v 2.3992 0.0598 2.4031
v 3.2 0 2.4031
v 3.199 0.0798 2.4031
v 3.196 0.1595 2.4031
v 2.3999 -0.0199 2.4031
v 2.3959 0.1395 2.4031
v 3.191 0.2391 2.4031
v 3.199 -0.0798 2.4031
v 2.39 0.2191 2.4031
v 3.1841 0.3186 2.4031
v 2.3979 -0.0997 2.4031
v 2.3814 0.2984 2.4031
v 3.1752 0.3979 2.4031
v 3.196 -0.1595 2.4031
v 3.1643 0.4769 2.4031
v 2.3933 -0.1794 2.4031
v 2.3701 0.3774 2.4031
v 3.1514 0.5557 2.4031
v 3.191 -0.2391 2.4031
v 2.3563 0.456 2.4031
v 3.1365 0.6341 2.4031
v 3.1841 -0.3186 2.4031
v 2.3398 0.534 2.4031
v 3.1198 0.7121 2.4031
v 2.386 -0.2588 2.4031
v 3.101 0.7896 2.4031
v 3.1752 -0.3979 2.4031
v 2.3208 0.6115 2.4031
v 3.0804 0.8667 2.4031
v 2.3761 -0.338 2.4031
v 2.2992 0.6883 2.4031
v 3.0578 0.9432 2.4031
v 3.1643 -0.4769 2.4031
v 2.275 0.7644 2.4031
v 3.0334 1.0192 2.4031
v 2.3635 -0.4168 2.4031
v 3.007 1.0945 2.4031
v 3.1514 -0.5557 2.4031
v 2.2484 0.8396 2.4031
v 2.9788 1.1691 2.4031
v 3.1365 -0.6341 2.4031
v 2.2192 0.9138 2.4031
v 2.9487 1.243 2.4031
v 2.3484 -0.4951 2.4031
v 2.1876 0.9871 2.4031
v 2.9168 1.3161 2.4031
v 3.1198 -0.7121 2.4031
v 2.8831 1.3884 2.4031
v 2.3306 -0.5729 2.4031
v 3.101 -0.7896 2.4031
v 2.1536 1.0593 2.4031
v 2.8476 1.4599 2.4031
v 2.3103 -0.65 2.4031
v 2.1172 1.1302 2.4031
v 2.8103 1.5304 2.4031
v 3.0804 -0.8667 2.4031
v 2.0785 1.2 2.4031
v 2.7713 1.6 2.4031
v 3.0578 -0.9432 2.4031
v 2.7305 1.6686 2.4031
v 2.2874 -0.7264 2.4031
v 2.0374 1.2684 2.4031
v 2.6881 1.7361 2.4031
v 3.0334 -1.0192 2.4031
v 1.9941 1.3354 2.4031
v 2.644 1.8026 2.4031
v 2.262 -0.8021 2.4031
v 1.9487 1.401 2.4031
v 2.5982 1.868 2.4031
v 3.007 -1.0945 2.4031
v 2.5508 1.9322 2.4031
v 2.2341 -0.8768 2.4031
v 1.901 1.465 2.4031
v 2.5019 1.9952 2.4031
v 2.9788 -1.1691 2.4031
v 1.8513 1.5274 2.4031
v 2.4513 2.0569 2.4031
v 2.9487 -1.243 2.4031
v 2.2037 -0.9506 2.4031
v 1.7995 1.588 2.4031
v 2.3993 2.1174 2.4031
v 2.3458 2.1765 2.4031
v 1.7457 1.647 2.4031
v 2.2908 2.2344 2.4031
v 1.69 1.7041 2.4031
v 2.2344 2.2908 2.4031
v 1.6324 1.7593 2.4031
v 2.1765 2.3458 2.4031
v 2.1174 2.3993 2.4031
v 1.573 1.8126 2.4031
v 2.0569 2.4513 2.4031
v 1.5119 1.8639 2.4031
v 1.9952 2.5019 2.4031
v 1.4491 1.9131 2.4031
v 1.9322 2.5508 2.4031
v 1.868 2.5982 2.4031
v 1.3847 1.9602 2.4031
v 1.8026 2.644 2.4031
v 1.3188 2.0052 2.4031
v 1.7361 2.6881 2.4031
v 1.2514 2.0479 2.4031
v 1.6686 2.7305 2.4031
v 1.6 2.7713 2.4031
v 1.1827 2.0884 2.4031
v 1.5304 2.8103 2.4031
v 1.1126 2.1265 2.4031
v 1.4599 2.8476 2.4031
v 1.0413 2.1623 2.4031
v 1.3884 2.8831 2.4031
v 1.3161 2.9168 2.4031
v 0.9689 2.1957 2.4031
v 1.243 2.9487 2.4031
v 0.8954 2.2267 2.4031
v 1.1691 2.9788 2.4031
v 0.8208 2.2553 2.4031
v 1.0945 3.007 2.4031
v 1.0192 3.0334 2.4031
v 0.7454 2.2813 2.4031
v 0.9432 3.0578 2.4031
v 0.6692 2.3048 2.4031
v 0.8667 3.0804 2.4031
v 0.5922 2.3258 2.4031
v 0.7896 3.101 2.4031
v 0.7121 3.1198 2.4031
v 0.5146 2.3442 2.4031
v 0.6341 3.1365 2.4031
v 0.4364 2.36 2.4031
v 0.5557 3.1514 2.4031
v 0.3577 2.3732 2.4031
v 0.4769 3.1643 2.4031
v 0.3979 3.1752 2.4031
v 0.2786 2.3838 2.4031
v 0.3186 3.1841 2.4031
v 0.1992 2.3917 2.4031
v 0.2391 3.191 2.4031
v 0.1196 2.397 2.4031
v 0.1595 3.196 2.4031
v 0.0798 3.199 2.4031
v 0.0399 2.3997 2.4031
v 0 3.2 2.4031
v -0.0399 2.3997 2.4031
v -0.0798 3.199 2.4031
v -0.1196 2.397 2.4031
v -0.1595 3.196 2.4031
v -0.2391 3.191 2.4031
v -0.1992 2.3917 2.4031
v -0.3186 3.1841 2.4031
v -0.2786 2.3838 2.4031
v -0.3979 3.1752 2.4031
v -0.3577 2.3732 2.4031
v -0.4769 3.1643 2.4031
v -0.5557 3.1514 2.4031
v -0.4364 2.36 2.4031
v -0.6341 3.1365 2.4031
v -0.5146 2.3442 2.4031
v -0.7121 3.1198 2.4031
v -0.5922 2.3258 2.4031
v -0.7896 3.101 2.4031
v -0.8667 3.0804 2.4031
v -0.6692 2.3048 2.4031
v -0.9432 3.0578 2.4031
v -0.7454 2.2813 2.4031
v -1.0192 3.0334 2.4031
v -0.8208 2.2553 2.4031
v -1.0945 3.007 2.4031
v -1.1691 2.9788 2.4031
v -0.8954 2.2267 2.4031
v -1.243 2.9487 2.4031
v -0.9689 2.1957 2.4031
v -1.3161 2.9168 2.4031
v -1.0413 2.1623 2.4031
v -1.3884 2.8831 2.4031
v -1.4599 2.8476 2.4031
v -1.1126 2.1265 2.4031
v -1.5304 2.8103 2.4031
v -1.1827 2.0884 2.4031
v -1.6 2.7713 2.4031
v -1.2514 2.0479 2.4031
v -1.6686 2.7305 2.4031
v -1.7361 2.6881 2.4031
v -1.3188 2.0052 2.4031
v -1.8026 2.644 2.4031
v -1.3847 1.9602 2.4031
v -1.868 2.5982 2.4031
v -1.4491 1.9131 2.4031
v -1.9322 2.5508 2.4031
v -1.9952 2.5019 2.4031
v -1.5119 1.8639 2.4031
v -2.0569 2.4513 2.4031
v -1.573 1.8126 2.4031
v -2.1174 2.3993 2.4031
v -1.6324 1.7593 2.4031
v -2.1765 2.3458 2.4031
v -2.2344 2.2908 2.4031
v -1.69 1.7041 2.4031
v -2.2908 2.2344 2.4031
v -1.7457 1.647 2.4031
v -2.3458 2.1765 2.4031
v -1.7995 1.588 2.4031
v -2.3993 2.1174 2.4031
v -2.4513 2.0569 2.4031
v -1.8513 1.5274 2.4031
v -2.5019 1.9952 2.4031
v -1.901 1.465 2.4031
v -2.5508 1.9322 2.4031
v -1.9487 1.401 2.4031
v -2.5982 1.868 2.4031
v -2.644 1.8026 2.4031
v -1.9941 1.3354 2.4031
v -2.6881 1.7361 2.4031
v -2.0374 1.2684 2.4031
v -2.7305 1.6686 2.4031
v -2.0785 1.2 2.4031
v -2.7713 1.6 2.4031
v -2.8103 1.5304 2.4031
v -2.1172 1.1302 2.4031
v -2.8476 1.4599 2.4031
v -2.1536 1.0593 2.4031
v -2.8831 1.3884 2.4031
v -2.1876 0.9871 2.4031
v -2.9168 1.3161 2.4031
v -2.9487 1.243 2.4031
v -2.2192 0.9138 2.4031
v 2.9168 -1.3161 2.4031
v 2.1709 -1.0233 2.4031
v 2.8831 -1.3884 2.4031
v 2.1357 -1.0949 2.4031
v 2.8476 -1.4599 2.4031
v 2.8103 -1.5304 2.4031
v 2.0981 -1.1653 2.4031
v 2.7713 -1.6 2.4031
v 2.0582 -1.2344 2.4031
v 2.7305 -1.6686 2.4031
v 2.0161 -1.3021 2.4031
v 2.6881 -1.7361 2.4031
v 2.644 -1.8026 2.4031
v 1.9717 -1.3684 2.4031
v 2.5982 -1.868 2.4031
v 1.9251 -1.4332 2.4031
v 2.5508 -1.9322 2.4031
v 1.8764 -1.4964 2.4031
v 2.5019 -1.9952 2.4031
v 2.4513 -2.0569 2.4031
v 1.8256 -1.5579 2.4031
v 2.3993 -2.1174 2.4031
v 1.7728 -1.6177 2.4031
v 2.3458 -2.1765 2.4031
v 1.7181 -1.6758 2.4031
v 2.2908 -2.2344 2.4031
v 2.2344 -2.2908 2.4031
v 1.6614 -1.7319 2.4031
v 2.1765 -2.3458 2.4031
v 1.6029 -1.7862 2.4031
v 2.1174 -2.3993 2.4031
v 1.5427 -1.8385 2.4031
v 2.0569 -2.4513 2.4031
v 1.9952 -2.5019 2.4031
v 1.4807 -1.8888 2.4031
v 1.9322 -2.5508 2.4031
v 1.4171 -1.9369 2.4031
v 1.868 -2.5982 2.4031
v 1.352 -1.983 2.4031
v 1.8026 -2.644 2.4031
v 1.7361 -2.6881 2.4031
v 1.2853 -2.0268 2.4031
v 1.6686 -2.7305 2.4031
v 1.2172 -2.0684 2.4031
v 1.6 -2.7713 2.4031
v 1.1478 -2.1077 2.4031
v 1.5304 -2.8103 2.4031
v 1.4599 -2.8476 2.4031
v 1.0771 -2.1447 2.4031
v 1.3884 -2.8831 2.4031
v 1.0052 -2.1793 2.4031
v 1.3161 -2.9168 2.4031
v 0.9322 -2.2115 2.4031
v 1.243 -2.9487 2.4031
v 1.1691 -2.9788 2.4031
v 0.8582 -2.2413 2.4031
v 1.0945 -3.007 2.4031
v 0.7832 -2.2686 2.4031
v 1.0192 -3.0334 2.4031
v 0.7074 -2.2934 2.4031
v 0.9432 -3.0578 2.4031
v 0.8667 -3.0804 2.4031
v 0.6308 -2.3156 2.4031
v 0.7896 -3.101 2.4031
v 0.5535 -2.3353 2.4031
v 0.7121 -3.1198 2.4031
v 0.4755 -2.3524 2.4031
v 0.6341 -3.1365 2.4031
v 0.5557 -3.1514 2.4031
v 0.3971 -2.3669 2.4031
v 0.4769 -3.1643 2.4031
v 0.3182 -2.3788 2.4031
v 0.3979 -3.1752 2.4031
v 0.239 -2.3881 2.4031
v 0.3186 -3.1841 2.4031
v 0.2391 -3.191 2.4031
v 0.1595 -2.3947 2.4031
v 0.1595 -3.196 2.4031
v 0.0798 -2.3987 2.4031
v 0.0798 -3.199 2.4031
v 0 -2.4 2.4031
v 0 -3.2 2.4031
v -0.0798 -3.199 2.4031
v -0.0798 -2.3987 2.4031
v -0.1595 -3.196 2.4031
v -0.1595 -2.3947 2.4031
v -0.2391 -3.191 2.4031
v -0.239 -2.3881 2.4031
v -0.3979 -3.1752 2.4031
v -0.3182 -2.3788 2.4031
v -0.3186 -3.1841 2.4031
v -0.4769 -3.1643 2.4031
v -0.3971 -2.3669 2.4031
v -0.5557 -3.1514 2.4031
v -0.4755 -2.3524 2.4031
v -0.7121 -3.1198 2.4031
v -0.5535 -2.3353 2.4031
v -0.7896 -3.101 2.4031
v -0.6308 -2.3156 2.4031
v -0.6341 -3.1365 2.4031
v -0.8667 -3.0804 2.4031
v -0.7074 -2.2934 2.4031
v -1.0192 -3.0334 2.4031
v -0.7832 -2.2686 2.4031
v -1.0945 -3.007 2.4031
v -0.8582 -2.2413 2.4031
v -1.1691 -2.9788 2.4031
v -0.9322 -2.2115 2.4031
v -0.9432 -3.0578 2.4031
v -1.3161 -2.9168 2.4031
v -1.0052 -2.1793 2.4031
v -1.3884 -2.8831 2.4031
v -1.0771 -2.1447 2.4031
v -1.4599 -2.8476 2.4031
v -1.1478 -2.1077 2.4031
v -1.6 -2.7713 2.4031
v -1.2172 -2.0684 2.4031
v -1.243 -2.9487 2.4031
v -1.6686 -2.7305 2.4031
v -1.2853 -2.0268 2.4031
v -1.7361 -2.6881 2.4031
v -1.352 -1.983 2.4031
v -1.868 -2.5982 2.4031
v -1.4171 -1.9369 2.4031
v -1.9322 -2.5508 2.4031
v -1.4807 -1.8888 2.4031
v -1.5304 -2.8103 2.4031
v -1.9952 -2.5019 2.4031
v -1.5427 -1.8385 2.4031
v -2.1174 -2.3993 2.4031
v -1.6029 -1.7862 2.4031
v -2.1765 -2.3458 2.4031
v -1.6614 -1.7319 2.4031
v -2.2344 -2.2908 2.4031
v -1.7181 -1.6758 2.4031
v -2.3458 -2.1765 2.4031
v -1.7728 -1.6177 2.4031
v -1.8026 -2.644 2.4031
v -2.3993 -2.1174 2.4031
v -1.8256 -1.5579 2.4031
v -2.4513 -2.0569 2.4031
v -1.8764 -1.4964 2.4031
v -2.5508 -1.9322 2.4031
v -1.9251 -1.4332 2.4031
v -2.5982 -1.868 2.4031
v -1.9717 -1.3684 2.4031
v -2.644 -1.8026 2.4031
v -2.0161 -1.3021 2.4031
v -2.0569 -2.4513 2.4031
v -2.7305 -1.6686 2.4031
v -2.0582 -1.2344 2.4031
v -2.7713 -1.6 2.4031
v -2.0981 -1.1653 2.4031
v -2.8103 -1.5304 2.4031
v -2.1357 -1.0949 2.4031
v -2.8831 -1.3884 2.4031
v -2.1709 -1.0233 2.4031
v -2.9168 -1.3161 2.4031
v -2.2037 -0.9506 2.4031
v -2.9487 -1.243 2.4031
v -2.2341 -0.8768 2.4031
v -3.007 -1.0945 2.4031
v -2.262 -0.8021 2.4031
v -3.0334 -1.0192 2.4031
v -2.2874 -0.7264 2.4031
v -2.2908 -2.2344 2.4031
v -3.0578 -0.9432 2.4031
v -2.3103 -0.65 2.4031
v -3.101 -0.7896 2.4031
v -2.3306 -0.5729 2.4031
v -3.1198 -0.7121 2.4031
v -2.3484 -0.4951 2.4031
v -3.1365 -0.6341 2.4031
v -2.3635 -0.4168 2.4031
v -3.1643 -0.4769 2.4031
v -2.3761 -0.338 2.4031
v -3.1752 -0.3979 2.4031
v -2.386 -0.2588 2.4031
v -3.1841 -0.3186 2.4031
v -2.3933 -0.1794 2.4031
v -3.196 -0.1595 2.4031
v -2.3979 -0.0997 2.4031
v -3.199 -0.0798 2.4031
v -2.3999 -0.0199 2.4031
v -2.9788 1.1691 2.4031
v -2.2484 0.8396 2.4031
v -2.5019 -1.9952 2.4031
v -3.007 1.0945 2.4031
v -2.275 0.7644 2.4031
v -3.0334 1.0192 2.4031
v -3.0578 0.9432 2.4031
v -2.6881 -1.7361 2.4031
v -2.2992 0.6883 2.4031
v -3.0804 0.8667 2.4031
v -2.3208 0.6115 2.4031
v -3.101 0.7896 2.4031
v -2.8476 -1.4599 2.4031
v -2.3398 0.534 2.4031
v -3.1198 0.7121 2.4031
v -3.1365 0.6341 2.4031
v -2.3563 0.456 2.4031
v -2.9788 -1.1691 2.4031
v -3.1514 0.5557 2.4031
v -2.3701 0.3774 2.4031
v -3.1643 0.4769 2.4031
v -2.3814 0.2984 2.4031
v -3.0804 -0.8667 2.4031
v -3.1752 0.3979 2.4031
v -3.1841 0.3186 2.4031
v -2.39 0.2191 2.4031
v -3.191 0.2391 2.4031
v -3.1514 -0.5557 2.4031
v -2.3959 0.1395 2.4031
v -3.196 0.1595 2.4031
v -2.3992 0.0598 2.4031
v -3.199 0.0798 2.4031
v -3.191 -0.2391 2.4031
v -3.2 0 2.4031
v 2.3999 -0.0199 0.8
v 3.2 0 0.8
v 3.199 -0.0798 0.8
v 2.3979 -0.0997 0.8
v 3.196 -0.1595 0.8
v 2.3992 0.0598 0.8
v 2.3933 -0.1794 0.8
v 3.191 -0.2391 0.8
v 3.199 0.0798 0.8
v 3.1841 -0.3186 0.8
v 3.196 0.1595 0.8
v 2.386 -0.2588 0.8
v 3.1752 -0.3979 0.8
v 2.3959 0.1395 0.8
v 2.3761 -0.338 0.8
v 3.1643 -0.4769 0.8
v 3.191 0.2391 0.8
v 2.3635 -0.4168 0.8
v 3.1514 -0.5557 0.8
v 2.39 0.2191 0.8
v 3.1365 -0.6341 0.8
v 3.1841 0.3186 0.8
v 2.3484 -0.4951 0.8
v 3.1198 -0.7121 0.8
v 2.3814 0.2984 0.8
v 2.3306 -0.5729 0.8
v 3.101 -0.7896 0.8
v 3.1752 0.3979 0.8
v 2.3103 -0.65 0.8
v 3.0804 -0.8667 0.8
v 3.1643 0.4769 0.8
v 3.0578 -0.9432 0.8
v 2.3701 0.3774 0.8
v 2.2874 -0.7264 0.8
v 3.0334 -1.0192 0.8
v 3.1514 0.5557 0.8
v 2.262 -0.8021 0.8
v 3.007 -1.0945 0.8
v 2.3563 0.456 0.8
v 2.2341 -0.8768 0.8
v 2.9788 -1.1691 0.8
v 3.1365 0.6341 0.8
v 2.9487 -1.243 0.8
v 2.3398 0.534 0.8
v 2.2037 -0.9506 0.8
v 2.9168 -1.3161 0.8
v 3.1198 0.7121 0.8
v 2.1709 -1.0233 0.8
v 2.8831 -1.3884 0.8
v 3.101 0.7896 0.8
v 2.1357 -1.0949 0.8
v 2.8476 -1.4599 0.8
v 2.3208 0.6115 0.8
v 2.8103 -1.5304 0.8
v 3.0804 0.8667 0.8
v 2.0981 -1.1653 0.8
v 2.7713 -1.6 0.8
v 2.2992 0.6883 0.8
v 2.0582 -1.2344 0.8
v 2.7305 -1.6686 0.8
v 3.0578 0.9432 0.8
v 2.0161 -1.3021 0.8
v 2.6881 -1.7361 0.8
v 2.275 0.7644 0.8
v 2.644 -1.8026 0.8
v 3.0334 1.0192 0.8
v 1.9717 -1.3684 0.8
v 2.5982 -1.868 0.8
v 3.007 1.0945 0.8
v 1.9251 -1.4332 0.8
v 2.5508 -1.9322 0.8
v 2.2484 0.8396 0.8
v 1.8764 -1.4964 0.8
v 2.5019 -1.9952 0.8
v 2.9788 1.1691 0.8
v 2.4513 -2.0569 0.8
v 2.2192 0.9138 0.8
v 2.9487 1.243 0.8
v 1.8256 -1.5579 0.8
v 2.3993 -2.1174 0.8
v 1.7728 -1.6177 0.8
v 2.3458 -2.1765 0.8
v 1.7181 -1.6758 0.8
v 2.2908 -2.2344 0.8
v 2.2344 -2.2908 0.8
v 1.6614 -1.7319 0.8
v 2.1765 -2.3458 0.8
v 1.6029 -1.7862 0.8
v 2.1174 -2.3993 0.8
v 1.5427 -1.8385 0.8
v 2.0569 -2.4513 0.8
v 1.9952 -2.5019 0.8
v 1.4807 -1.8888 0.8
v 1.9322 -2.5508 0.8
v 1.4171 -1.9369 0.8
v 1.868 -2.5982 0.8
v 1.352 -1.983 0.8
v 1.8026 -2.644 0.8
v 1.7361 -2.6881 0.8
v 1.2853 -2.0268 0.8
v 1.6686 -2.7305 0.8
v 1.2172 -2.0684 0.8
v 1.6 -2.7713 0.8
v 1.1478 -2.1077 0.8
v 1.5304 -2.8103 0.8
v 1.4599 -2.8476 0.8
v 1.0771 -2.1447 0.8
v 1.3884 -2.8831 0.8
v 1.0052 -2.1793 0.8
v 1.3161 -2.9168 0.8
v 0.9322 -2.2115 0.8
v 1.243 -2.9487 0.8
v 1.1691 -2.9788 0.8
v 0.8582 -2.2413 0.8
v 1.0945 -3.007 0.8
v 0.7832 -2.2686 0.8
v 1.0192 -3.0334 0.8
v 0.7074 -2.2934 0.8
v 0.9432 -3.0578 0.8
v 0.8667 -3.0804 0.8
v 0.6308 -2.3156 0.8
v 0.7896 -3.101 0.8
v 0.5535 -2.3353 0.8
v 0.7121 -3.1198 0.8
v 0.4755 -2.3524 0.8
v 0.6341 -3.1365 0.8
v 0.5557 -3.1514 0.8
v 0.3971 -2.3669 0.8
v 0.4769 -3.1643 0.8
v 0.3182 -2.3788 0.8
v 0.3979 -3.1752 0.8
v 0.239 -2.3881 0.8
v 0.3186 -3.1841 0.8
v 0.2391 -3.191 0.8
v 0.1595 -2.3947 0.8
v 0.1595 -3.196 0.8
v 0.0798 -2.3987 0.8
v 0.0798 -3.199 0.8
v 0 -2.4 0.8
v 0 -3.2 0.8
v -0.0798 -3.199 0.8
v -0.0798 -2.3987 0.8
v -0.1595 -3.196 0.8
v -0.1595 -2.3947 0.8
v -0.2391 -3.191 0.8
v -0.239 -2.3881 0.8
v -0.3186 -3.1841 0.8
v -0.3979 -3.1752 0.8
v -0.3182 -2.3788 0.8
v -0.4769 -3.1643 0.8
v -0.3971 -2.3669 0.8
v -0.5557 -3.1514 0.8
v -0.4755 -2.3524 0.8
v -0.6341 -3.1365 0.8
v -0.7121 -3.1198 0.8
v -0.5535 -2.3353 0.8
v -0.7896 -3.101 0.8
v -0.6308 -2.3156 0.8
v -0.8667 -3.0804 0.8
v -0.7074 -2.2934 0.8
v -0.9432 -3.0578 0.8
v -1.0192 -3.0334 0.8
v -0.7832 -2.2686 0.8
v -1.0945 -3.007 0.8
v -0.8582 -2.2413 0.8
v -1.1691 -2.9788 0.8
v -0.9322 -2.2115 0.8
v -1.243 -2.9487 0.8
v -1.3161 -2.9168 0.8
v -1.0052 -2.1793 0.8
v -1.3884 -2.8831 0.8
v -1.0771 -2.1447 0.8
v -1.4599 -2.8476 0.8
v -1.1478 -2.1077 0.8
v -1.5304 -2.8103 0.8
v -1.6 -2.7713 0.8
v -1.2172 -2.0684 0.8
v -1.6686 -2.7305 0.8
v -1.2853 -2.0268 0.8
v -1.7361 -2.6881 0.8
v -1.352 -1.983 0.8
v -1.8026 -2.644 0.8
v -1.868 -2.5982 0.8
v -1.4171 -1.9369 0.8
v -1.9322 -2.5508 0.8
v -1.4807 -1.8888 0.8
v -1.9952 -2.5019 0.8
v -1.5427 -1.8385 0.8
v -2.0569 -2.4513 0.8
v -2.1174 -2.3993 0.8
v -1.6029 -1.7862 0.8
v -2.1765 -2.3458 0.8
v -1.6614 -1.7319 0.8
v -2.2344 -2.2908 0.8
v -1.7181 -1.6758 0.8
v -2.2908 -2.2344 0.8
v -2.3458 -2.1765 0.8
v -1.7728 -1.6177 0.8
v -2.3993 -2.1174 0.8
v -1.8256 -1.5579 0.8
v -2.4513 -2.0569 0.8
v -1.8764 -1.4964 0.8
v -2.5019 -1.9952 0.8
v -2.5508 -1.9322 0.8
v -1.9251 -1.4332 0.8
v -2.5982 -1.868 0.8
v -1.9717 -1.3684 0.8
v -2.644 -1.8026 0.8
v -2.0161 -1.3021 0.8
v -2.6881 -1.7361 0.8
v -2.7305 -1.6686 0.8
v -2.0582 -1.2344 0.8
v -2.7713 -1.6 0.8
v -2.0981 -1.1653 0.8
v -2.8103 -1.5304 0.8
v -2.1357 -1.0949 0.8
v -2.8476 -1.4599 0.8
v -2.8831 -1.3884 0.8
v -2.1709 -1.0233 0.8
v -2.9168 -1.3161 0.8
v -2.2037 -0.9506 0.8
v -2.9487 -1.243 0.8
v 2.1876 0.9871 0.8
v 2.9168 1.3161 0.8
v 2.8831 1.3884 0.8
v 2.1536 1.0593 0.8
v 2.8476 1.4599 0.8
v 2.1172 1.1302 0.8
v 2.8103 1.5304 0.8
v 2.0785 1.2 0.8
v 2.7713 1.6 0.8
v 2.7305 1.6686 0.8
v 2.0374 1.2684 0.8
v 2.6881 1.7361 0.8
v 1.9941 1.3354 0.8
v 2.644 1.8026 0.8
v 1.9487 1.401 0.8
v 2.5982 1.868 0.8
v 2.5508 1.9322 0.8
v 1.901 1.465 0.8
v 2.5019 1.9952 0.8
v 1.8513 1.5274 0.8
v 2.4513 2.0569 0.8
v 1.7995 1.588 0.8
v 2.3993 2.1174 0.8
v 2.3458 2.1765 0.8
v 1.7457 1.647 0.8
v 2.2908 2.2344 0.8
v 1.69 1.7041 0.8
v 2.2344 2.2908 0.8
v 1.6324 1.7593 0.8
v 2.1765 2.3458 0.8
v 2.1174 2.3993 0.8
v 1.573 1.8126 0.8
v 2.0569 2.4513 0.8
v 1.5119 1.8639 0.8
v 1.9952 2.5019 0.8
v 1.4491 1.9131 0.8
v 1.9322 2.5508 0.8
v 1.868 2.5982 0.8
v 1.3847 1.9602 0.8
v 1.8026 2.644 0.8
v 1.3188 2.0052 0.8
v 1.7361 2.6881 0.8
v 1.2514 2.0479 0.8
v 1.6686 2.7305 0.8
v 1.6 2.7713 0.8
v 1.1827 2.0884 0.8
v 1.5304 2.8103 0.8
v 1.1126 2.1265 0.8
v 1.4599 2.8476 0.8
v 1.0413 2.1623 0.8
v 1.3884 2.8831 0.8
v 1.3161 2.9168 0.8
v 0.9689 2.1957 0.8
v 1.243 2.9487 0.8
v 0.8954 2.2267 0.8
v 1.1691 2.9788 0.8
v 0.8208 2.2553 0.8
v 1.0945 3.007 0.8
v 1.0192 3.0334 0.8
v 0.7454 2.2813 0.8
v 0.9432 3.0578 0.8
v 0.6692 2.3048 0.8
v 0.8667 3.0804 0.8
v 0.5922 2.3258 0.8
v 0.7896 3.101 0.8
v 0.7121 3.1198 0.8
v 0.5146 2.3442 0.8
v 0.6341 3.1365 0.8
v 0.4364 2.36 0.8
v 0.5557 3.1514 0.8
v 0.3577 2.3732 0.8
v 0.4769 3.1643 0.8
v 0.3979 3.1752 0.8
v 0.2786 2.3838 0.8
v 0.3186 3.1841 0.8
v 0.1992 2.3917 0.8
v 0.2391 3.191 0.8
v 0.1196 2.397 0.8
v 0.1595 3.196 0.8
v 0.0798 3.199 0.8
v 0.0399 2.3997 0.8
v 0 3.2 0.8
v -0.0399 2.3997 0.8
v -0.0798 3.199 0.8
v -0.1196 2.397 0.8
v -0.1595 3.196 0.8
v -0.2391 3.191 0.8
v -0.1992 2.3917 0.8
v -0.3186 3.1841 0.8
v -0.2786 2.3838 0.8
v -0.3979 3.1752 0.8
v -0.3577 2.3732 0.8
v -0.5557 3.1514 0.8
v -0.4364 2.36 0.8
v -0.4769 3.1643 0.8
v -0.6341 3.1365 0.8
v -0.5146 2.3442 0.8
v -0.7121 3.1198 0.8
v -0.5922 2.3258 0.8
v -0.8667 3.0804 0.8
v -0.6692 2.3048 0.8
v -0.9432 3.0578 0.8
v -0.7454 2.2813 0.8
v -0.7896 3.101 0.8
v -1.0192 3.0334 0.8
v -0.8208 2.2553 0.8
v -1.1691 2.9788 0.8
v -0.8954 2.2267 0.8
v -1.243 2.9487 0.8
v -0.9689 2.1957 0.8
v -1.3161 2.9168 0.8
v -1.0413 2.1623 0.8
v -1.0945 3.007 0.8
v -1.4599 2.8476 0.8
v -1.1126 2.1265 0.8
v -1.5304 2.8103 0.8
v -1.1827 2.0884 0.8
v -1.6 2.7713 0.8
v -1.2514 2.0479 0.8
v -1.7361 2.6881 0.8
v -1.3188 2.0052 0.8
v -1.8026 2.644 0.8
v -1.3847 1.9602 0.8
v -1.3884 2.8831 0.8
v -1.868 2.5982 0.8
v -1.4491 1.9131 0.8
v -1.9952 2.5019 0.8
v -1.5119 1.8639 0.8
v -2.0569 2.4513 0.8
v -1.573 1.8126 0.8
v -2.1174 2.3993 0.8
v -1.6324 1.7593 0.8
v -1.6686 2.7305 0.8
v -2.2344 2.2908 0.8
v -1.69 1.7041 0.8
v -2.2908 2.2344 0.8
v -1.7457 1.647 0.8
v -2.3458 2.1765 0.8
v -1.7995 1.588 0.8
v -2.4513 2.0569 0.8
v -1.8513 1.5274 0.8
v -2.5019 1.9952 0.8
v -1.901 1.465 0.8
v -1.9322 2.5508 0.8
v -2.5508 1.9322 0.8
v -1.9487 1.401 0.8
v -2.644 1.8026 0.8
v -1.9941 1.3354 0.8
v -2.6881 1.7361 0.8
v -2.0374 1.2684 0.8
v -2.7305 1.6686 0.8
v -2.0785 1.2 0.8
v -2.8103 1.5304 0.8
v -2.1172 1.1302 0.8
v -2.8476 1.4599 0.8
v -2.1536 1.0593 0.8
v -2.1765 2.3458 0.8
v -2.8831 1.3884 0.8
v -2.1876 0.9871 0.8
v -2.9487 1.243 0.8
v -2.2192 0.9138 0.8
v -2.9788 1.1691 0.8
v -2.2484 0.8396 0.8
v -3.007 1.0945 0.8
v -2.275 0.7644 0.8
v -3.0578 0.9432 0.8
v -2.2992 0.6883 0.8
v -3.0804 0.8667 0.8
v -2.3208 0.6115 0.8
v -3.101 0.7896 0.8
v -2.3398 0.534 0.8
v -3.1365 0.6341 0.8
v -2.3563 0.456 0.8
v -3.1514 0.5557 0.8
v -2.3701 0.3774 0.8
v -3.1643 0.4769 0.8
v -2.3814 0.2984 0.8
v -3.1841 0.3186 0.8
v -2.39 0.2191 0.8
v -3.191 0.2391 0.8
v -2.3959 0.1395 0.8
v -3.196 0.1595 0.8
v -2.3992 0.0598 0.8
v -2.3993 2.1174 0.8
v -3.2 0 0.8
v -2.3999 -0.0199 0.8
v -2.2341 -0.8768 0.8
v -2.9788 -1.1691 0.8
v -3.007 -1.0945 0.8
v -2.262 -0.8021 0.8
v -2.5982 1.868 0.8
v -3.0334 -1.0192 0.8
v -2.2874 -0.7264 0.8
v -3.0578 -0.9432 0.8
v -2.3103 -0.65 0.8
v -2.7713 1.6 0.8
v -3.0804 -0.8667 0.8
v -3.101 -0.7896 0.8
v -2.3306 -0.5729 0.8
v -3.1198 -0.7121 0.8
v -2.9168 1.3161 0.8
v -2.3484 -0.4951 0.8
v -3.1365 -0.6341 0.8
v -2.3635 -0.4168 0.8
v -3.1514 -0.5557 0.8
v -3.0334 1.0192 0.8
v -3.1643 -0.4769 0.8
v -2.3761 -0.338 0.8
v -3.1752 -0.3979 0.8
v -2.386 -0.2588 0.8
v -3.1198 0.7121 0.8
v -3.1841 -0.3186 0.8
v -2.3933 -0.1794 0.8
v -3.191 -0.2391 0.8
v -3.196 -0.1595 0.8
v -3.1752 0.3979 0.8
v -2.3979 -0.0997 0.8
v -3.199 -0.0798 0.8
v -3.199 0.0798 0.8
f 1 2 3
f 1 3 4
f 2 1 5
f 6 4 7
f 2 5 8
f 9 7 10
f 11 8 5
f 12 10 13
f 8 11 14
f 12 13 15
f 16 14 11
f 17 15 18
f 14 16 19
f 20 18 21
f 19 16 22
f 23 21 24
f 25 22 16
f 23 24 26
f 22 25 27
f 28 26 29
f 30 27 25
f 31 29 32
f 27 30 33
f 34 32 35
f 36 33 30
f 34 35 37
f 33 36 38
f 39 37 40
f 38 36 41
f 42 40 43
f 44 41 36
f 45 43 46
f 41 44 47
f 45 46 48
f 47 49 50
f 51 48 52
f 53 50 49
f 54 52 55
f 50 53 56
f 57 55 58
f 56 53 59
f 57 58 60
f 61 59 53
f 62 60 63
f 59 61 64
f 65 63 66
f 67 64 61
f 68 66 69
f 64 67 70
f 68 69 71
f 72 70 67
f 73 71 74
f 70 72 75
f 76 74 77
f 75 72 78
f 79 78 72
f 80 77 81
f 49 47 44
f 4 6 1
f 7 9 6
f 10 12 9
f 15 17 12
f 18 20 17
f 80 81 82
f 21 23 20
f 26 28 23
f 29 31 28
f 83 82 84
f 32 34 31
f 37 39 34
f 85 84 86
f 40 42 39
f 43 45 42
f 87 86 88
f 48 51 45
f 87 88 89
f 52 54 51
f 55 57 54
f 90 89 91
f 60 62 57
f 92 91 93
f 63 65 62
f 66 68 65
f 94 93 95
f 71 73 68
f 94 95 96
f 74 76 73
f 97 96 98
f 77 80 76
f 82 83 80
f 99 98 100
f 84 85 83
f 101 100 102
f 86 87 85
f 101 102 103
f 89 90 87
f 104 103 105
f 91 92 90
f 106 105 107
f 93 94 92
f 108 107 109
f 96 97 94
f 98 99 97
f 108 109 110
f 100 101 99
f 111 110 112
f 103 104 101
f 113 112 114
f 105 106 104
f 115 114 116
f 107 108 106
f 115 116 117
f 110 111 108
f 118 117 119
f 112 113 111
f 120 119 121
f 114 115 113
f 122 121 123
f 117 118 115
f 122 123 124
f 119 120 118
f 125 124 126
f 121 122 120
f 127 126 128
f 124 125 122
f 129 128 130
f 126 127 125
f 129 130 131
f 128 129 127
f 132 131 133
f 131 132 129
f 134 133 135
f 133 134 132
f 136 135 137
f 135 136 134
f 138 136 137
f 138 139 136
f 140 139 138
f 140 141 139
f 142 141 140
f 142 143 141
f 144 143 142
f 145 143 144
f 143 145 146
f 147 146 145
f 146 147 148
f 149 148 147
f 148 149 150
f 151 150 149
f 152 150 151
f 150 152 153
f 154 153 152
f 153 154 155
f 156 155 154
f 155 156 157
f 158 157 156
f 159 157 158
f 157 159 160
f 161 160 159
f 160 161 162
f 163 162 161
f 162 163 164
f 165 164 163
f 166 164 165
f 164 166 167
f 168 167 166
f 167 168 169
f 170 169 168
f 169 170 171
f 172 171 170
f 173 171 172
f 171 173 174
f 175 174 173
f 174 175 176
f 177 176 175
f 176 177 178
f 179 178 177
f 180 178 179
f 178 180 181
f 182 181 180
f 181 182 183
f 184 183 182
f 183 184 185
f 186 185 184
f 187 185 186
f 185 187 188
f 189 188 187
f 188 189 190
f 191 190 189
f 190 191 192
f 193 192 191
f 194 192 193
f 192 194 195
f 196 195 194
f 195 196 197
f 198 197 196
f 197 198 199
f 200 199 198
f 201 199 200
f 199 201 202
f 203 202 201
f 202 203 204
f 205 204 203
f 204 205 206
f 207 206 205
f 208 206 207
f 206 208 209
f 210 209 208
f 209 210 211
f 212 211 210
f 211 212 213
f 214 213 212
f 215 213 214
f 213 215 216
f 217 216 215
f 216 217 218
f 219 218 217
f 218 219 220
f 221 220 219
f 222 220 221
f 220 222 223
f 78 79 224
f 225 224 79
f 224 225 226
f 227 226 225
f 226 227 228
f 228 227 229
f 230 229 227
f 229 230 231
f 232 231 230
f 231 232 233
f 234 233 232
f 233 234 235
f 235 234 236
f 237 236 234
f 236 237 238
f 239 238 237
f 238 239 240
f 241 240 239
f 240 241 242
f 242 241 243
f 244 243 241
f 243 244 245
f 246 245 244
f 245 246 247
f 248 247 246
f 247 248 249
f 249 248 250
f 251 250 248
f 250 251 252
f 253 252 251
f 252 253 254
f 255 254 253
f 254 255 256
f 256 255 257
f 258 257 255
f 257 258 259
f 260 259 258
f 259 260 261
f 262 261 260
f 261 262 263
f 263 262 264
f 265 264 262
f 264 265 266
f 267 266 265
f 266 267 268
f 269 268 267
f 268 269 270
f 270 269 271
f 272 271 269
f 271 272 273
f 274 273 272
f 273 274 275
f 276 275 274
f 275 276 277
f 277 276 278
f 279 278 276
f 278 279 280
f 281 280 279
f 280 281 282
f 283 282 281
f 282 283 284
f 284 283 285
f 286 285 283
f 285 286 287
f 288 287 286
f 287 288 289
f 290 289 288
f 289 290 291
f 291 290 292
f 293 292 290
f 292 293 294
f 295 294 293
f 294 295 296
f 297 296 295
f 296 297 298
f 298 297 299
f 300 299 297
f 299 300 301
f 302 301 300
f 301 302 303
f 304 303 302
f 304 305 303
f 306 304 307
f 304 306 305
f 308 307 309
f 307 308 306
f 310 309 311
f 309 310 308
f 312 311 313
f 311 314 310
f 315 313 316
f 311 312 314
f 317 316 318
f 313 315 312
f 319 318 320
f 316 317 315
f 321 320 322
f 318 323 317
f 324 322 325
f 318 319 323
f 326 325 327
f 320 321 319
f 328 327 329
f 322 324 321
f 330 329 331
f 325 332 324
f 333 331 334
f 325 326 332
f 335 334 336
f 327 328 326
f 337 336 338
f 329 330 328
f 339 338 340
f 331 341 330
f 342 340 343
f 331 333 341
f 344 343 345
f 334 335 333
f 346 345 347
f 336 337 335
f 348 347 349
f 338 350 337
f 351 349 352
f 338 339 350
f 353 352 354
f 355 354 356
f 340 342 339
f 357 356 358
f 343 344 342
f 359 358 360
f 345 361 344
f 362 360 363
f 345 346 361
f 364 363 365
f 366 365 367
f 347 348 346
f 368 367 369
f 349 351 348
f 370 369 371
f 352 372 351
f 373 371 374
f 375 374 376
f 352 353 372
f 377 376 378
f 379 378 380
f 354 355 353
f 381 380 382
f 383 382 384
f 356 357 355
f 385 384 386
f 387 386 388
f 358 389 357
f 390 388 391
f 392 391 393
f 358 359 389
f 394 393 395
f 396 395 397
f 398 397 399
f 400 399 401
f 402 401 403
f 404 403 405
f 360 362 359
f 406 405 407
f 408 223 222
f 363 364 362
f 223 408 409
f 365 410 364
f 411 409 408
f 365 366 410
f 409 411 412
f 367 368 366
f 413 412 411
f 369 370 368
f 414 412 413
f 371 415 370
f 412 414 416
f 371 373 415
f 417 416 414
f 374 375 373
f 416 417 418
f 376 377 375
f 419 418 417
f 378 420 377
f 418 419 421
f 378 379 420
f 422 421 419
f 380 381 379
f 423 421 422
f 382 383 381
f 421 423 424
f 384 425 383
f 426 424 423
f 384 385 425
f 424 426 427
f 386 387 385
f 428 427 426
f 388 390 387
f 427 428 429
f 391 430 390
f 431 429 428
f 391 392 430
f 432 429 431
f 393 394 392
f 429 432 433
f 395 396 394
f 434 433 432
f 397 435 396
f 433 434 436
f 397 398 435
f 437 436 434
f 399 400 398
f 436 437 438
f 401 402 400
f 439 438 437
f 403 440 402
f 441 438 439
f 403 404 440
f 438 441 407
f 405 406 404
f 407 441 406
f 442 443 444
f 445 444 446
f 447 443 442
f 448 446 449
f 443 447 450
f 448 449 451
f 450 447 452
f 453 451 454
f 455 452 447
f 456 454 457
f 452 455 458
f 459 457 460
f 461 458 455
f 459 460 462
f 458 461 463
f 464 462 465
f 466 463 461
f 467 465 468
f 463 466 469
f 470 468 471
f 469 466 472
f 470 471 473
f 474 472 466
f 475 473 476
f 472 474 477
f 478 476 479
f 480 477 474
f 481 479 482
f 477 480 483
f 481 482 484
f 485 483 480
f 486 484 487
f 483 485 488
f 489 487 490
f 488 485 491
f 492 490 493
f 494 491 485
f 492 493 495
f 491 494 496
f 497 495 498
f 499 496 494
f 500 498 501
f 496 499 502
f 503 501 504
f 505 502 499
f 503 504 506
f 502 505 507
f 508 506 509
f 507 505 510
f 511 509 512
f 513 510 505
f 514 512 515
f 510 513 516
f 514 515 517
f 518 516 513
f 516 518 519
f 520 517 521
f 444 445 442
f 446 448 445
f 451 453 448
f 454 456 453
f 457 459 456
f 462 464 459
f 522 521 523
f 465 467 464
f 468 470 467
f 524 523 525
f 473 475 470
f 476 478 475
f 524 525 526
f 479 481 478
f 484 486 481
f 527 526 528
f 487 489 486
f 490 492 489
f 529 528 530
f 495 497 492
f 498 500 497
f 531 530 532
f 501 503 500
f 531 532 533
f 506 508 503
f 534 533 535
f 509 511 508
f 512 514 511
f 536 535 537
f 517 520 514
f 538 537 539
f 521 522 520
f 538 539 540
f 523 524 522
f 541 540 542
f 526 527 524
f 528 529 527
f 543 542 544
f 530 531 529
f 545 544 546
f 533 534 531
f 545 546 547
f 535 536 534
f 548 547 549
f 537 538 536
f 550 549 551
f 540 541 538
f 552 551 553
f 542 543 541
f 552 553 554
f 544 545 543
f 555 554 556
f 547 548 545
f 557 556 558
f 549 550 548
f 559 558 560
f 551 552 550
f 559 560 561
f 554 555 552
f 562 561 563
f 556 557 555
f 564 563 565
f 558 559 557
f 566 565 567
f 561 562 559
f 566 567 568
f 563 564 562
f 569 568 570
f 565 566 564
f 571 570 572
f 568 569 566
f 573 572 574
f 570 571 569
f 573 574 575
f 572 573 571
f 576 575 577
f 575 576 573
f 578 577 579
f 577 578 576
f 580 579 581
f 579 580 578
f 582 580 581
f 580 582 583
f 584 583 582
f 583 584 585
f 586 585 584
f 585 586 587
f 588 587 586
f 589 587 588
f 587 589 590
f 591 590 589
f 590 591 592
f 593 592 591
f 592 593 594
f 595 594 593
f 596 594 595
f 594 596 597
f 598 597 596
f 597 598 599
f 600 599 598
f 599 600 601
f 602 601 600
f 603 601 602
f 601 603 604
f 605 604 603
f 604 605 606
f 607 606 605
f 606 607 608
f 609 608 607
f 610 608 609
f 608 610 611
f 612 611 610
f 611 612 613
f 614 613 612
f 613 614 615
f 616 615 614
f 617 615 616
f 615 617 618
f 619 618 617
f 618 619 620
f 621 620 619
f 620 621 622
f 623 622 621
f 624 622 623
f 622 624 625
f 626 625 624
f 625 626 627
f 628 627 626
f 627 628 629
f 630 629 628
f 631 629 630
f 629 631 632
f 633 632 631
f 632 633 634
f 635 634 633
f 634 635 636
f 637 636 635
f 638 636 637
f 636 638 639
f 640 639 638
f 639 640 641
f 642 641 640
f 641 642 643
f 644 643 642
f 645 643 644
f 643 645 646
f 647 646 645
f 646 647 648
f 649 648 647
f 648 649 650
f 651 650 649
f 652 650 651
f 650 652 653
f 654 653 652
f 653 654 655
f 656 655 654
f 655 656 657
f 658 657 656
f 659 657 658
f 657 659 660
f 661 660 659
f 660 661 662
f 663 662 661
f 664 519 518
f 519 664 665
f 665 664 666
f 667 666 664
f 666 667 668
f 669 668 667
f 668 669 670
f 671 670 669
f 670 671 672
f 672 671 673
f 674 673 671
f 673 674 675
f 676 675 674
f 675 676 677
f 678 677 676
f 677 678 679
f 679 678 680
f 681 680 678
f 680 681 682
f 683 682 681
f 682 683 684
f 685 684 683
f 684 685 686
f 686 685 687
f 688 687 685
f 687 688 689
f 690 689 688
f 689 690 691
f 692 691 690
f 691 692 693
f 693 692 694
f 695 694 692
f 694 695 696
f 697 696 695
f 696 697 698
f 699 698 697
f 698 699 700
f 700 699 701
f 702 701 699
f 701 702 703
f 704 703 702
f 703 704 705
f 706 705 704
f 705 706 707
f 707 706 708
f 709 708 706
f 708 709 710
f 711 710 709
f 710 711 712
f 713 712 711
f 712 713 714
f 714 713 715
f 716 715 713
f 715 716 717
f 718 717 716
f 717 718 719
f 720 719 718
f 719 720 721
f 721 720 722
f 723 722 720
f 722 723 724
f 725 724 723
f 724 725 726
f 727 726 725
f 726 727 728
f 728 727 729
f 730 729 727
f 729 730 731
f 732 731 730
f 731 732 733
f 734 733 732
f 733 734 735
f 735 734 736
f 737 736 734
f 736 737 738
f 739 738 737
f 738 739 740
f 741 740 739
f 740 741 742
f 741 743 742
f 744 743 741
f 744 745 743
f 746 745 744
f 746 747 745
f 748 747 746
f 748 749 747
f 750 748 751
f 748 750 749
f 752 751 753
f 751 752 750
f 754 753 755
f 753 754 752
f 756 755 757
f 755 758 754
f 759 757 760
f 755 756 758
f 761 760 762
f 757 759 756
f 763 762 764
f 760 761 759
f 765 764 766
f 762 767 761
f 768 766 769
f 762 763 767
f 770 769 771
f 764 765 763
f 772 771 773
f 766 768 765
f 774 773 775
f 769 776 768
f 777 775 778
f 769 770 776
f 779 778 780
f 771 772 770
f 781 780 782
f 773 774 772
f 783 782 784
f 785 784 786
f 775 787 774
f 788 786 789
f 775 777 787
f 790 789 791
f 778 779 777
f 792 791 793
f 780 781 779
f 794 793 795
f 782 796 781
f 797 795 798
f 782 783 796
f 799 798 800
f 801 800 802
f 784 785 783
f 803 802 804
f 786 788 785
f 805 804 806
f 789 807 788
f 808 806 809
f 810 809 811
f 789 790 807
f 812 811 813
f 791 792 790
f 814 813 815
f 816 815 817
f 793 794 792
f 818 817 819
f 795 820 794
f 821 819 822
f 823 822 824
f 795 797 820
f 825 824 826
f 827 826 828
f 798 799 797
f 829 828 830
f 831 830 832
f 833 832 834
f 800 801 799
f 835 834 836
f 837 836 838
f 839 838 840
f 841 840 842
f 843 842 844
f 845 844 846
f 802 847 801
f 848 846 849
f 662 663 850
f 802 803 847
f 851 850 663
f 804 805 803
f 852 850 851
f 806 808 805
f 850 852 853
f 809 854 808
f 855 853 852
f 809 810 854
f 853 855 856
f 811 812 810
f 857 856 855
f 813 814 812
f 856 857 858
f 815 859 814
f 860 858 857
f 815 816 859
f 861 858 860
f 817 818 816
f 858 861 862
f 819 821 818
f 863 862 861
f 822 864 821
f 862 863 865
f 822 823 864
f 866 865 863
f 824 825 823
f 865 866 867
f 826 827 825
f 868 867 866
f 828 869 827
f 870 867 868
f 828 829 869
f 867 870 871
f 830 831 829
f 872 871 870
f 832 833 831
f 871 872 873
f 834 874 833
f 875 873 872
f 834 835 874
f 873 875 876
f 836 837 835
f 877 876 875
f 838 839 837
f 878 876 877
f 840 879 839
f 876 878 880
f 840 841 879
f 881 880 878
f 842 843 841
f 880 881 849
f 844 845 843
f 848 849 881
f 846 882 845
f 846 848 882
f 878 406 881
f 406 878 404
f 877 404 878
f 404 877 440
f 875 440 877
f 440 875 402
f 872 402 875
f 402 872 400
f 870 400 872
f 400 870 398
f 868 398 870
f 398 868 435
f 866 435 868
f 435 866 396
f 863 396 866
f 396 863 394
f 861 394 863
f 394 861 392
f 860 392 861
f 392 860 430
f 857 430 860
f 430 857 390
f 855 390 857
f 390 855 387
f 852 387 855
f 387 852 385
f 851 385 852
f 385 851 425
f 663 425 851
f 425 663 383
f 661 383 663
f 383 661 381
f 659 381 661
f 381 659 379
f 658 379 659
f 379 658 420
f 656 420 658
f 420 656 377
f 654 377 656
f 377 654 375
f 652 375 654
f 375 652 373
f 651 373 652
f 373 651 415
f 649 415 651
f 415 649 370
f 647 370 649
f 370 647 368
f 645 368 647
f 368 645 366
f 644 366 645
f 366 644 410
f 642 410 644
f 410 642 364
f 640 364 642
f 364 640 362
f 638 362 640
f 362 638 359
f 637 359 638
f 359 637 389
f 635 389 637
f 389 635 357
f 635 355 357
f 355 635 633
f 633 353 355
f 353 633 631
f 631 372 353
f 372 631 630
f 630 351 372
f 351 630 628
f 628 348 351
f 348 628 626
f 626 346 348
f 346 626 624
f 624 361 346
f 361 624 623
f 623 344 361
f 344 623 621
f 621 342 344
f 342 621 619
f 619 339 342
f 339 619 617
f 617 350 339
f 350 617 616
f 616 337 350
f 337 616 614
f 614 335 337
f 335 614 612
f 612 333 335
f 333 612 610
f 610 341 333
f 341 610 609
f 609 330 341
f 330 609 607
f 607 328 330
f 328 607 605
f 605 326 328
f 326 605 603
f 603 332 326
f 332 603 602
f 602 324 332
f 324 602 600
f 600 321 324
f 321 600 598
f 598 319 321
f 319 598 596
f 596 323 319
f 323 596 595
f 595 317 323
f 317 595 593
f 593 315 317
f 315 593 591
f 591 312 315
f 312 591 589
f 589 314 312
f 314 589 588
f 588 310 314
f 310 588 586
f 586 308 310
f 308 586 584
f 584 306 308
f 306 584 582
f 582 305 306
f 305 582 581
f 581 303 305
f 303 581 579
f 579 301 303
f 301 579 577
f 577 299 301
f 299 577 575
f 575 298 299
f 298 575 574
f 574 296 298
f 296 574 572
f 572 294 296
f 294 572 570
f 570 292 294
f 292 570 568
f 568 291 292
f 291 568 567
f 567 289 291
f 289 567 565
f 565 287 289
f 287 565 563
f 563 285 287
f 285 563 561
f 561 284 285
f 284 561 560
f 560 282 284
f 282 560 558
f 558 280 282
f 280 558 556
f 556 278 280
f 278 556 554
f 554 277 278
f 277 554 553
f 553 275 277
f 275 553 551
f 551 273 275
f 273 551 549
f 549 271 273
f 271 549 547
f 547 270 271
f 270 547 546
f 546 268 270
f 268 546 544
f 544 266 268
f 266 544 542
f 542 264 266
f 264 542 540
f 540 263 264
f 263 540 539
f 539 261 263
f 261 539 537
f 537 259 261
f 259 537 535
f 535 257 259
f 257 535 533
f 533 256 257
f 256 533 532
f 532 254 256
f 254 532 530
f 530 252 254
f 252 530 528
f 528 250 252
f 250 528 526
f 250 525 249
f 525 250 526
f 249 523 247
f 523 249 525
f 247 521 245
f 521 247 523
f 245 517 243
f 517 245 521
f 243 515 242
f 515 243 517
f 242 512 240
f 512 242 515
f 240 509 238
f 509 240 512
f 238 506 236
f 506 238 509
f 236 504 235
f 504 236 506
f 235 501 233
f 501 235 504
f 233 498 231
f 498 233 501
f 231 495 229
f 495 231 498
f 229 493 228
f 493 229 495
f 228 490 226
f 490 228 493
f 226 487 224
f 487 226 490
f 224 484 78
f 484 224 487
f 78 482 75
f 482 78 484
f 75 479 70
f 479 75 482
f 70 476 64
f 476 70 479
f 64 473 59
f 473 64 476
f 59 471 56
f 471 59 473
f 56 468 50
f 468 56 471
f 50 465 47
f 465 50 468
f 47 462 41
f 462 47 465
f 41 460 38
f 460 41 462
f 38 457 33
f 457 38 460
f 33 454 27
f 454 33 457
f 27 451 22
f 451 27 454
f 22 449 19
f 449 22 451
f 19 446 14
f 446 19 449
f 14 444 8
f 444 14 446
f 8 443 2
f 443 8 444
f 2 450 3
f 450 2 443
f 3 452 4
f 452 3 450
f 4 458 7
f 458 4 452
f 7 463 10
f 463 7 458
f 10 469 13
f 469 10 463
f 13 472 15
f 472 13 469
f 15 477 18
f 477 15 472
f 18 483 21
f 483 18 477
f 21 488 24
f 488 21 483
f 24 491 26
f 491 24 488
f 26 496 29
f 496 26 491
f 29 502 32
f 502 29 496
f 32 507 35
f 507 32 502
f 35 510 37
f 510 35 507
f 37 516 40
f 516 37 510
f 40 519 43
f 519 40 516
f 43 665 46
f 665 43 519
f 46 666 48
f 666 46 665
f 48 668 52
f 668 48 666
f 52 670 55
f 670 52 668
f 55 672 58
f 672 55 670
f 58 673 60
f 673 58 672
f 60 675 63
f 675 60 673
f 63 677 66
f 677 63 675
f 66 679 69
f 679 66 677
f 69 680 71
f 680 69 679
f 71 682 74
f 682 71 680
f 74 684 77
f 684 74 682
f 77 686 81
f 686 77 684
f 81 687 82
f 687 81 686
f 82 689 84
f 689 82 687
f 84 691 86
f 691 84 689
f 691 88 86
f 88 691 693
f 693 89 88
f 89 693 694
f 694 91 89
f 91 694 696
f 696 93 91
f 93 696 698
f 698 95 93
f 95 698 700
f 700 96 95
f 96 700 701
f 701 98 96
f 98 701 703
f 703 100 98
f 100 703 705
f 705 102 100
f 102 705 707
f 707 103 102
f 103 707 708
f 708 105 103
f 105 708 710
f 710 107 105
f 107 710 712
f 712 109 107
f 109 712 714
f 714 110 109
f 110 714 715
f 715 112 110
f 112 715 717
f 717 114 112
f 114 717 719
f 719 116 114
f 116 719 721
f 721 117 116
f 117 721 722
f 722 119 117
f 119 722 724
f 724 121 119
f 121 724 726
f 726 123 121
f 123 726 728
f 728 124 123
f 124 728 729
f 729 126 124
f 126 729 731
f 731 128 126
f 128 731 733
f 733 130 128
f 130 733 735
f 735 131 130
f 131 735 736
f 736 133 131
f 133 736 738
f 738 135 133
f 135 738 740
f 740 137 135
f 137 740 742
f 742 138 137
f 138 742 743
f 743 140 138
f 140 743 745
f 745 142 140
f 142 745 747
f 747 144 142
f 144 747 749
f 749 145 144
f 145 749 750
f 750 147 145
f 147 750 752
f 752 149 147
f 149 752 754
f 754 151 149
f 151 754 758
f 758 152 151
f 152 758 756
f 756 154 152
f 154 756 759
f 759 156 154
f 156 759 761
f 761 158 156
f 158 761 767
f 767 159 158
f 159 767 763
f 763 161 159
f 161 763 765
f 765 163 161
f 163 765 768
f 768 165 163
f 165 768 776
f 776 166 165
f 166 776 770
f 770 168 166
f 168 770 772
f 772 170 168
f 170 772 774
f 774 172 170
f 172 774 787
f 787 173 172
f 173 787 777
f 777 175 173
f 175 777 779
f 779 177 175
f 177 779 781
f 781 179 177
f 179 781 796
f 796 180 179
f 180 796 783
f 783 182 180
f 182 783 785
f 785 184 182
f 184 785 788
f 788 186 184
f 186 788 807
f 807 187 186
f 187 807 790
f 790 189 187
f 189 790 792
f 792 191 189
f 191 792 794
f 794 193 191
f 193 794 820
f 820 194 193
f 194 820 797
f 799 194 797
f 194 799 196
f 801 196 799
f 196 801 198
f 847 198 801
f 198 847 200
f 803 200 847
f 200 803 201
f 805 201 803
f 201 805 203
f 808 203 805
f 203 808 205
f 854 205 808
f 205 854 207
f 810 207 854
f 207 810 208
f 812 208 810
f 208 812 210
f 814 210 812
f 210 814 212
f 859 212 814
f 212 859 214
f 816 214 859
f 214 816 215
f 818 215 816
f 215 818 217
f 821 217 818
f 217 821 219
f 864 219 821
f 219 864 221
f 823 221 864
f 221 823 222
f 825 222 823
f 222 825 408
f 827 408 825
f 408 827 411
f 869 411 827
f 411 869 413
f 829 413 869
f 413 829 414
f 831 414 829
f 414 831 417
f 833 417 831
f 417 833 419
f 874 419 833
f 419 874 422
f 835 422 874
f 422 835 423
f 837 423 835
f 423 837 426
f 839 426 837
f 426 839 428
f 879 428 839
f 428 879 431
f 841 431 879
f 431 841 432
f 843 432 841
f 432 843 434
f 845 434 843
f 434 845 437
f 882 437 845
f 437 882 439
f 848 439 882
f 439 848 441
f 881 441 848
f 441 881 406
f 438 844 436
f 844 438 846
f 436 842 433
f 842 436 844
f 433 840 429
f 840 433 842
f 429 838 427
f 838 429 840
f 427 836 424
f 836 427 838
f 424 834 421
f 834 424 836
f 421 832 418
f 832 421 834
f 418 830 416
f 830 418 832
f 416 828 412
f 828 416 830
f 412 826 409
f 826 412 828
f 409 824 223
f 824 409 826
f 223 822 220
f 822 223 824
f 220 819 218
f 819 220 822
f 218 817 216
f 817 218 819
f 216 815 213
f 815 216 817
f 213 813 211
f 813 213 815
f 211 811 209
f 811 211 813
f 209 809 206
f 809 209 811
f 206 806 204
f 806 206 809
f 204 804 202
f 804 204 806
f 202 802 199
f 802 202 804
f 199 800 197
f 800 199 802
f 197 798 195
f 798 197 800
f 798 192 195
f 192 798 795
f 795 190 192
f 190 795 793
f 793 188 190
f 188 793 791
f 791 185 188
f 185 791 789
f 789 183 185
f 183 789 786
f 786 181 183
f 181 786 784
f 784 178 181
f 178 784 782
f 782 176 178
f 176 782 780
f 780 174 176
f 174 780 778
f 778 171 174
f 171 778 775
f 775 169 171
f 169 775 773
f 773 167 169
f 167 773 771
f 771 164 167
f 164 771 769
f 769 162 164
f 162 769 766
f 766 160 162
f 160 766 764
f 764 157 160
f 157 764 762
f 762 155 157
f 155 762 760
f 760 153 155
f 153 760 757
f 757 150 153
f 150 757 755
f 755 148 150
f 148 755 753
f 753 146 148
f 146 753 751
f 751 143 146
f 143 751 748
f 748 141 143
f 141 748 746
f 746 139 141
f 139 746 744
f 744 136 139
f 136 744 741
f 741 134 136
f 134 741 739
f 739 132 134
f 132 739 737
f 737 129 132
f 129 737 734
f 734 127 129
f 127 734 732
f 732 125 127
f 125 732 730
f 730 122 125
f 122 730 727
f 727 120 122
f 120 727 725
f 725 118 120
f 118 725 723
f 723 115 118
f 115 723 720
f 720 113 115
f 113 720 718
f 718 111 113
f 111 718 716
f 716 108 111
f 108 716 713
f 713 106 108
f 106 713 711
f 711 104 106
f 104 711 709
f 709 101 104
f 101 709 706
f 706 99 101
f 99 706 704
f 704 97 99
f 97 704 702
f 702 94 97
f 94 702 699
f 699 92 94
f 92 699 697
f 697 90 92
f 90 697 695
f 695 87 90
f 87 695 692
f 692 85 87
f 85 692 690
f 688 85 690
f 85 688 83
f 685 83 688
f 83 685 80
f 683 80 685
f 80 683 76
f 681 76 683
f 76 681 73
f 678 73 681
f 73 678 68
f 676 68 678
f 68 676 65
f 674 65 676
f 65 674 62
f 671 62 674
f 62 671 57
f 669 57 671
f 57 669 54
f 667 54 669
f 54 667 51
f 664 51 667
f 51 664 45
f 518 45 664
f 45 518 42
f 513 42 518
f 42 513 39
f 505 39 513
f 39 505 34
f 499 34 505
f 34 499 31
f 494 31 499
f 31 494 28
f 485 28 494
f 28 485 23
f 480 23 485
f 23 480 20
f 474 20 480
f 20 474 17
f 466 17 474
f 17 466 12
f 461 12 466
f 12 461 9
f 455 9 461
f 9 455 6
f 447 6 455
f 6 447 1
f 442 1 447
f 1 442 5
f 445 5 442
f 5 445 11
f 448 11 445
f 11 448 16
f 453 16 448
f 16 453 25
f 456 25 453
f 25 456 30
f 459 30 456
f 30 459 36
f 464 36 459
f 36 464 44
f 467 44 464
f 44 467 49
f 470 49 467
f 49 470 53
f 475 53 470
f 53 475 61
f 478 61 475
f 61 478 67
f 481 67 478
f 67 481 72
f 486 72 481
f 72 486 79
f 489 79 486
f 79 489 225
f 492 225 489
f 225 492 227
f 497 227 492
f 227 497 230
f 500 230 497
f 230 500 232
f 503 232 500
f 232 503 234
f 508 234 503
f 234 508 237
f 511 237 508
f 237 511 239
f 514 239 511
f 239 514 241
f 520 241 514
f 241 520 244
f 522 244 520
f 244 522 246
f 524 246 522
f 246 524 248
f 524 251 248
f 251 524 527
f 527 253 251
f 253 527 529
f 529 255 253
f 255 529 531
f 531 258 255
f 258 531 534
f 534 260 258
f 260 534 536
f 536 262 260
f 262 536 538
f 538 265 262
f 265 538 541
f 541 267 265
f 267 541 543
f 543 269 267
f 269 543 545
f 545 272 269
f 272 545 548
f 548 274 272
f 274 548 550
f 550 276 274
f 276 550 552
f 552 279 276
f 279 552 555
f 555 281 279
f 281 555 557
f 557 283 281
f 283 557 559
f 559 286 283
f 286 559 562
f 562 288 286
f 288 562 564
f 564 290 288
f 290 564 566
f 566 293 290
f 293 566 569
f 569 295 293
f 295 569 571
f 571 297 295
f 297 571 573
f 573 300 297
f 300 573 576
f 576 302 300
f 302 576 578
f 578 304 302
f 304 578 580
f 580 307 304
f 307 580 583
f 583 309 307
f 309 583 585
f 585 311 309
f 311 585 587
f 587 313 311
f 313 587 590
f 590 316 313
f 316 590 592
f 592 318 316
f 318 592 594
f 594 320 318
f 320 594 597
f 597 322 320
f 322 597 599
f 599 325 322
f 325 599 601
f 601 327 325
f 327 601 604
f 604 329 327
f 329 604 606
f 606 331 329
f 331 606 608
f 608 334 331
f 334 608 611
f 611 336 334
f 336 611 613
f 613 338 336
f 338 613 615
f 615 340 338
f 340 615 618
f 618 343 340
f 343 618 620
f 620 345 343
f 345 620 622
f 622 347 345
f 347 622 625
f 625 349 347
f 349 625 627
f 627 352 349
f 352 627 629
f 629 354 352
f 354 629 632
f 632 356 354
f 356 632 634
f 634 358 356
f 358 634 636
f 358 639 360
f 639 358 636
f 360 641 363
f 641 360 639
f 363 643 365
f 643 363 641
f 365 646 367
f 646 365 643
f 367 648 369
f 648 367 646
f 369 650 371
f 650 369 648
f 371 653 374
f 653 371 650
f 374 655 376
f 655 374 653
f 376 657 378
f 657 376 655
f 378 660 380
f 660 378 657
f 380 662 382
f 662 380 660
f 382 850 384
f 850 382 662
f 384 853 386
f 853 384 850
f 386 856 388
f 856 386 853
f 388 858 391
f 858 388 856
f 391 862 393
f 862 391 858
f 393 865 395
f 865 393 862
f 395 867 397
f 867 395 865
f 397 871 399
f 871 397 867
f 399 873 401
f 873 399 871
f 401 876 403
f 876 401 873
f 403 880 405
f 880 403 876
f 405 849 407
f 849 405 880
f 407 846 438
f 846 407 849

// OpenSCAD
use <../lib.scad>
use <s/u454p02s01.scad>
use <s/u454s01.scad>
$fa=1; $fs=0.2;
function ldraw_lib__u454p02(realsolid=false) = [
// 0 Signpost Slanted Cantilever with Suspended Sign with Shell Logo 1955 Pattern
// 0 Name: u454p02.dat
// 0 Author: Takeshi Takahashi [RainbowDolphin]
// 0 !LDRAW_ORG Part UPDATE 2022-02
// 0 !LICENSE Licensed under CC BY 2.0 and CC BY 4.0 : see CAreadme.txt
// 
// 0 BFC CERTIFY CCW
  [0,"BFC","CERTIFY"],
  [0,"BFC","CCW"],
// 
// 0 !CATEGORY Roadsign
// 0 !KEYWORDS Bricklink bb0107pb01, Set 325-3, Set 431-1, Set 491-2, Set 648-1
// 0 !KEYWORDS Set 842-2
// 
// 0 !HISTORY 2022-03-06 [PTadmin] Official Update 2022-02
// 
// 
// 1 16 0 0 0 1 0 0 0 1 0 0 0 1 s\u454s01.dat
  [1,16,0,0,0,1,0,0,0,1,0,0,0,1, ldraw_lib__s__u454s01(realsolid)],
// 1 16 1 -145 -44 1 0 0 0 1 0 0 0 1 s\u454p02s01.dat
  [1,16,1,-145,-44,1,0,0,0,1,0,0,0,1, ldraw_lib__s__u454p02s01(realsolid)],
// 1 16 -1 -145 -44 -1 0 0 0 1 0 0 0 -1 s\u454p02s01.dat
  [1,16,-1,-145,-44,-1,0,0,0,1,0,0,0,-1, ldraw_lib__s__u454p02s01(realsolid)],
];
module ldraw_lib__u454p02(step=0, col=false, unit=2/5, alt=false, line=0.2, solid=!$preview)
    makepoly(ldraw_lib__u454p02(solid), step=step, col=col, unit=unit, alt=alt, line=line, solid=solid);
ldraw_lib__u454p02(line=0.2);
